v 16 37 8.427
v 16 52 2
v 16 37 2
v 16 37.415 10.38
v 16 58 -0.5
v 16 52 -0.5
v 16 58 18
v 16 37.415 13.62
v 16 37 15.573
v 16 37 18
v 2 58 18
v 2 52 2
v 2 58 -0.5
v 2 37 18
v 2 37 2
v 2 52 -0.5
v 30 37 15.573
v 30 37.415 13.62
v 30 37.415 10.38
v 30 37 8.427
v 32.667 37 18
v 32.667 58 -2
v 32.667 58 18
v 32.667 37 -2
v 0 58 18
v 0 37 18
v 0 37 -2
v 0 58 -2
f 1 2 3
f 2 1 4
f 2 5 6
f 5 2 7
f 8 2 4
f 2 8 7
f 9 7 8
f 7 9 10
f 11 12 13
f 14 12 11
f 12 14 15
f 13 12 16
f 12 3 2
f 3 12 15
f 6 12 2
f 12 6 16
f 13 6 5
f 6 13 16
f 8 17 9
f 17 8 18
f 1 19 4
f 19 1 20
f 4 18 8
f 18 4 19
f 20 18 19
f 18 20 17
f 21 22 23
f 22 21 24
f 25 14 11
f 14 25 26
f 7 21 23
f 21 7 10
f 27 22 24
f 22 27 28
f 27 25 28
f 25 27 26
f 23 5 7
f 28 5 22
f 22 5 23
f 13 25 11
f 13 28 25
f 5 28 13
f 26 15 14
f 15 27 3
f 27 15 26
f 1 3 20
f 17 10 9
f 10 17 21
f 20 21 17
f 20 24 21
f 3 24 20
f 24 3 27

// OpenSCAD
/* Hive13 SumoBot Chassis/Frame */ 

// The front plow takes up a depth of 16.
// Some space is used for linesensor screw holes ~14mm

max_w = 98;
max_d = 98 - 16;

batterypack_w = 63;
batterypack_h = 15;
batterypack_d = 49;

bpack2_w = 54;
bpack2_h = 11;
bpack2_d = 31;

micro_w = 70;
micro_h = 15; // We just go to the top of the shield
micro_d = 54;

frame_w = max_w;
frame_h = 3;
frame_d = max_d;

// tire + motor thickness ~30
wheel_radius = 15.5;
wheel_thickness = 14;
motor_w =14;
motor_h = 58;
motor_d = 20;
lip_w = motor_w;
lip_h = 18;
lip_d = 25;
lip_dist_from_bottom_motor = 40;
tire_distance = 9;
cfr_rad=4;

linesensor_spacing = 18;
linesensor_depth = 23;
frame_wheel_d = 36;
wheel_clearance = 12;
backwall_thickness = 15;



module motor() { 
color([0,0,0,255]) {
union() {
cube([motor_w, motor_d, motor_h]);
// Lip
translate(v = [0, -(lip_d-motor_d)/2, lip_dist_from_bottom_motor]) {
cube([lip_w, lip_d, lip_h]);
}
// wheel
translate(v = [motor_w,motor_d/2,motor_d/2]) {
rotate(a = [90, 0, 90]) {
cylinder(r = wheel_radius, h = wheel_thickness);
}
}
}
}
}


module both_motor(){
// Right Tire 
translate(v = [max_w-2, 12, -motor_d+22]) {
rotate(a = [270, 180, 0]) {
motor();
}
}
// Left Tire
translate(v = [2, 12, 22]) {
rotate(a = [270, 0, 0]) {
motor();
}
}
}


difference(){
translate(v = [0,frame_wheel_d+1,frame_h-5]) {
cube([frame_w/3, frame_d -(frame_wheel_d + linesensor_depth)-2, lip_d-5]);
}

translate(v = [2, 12, 22]) {
rotate(a = [270, 0, 0]) {
motor();
}
}


}

//motor_holder();
//both_motor();
